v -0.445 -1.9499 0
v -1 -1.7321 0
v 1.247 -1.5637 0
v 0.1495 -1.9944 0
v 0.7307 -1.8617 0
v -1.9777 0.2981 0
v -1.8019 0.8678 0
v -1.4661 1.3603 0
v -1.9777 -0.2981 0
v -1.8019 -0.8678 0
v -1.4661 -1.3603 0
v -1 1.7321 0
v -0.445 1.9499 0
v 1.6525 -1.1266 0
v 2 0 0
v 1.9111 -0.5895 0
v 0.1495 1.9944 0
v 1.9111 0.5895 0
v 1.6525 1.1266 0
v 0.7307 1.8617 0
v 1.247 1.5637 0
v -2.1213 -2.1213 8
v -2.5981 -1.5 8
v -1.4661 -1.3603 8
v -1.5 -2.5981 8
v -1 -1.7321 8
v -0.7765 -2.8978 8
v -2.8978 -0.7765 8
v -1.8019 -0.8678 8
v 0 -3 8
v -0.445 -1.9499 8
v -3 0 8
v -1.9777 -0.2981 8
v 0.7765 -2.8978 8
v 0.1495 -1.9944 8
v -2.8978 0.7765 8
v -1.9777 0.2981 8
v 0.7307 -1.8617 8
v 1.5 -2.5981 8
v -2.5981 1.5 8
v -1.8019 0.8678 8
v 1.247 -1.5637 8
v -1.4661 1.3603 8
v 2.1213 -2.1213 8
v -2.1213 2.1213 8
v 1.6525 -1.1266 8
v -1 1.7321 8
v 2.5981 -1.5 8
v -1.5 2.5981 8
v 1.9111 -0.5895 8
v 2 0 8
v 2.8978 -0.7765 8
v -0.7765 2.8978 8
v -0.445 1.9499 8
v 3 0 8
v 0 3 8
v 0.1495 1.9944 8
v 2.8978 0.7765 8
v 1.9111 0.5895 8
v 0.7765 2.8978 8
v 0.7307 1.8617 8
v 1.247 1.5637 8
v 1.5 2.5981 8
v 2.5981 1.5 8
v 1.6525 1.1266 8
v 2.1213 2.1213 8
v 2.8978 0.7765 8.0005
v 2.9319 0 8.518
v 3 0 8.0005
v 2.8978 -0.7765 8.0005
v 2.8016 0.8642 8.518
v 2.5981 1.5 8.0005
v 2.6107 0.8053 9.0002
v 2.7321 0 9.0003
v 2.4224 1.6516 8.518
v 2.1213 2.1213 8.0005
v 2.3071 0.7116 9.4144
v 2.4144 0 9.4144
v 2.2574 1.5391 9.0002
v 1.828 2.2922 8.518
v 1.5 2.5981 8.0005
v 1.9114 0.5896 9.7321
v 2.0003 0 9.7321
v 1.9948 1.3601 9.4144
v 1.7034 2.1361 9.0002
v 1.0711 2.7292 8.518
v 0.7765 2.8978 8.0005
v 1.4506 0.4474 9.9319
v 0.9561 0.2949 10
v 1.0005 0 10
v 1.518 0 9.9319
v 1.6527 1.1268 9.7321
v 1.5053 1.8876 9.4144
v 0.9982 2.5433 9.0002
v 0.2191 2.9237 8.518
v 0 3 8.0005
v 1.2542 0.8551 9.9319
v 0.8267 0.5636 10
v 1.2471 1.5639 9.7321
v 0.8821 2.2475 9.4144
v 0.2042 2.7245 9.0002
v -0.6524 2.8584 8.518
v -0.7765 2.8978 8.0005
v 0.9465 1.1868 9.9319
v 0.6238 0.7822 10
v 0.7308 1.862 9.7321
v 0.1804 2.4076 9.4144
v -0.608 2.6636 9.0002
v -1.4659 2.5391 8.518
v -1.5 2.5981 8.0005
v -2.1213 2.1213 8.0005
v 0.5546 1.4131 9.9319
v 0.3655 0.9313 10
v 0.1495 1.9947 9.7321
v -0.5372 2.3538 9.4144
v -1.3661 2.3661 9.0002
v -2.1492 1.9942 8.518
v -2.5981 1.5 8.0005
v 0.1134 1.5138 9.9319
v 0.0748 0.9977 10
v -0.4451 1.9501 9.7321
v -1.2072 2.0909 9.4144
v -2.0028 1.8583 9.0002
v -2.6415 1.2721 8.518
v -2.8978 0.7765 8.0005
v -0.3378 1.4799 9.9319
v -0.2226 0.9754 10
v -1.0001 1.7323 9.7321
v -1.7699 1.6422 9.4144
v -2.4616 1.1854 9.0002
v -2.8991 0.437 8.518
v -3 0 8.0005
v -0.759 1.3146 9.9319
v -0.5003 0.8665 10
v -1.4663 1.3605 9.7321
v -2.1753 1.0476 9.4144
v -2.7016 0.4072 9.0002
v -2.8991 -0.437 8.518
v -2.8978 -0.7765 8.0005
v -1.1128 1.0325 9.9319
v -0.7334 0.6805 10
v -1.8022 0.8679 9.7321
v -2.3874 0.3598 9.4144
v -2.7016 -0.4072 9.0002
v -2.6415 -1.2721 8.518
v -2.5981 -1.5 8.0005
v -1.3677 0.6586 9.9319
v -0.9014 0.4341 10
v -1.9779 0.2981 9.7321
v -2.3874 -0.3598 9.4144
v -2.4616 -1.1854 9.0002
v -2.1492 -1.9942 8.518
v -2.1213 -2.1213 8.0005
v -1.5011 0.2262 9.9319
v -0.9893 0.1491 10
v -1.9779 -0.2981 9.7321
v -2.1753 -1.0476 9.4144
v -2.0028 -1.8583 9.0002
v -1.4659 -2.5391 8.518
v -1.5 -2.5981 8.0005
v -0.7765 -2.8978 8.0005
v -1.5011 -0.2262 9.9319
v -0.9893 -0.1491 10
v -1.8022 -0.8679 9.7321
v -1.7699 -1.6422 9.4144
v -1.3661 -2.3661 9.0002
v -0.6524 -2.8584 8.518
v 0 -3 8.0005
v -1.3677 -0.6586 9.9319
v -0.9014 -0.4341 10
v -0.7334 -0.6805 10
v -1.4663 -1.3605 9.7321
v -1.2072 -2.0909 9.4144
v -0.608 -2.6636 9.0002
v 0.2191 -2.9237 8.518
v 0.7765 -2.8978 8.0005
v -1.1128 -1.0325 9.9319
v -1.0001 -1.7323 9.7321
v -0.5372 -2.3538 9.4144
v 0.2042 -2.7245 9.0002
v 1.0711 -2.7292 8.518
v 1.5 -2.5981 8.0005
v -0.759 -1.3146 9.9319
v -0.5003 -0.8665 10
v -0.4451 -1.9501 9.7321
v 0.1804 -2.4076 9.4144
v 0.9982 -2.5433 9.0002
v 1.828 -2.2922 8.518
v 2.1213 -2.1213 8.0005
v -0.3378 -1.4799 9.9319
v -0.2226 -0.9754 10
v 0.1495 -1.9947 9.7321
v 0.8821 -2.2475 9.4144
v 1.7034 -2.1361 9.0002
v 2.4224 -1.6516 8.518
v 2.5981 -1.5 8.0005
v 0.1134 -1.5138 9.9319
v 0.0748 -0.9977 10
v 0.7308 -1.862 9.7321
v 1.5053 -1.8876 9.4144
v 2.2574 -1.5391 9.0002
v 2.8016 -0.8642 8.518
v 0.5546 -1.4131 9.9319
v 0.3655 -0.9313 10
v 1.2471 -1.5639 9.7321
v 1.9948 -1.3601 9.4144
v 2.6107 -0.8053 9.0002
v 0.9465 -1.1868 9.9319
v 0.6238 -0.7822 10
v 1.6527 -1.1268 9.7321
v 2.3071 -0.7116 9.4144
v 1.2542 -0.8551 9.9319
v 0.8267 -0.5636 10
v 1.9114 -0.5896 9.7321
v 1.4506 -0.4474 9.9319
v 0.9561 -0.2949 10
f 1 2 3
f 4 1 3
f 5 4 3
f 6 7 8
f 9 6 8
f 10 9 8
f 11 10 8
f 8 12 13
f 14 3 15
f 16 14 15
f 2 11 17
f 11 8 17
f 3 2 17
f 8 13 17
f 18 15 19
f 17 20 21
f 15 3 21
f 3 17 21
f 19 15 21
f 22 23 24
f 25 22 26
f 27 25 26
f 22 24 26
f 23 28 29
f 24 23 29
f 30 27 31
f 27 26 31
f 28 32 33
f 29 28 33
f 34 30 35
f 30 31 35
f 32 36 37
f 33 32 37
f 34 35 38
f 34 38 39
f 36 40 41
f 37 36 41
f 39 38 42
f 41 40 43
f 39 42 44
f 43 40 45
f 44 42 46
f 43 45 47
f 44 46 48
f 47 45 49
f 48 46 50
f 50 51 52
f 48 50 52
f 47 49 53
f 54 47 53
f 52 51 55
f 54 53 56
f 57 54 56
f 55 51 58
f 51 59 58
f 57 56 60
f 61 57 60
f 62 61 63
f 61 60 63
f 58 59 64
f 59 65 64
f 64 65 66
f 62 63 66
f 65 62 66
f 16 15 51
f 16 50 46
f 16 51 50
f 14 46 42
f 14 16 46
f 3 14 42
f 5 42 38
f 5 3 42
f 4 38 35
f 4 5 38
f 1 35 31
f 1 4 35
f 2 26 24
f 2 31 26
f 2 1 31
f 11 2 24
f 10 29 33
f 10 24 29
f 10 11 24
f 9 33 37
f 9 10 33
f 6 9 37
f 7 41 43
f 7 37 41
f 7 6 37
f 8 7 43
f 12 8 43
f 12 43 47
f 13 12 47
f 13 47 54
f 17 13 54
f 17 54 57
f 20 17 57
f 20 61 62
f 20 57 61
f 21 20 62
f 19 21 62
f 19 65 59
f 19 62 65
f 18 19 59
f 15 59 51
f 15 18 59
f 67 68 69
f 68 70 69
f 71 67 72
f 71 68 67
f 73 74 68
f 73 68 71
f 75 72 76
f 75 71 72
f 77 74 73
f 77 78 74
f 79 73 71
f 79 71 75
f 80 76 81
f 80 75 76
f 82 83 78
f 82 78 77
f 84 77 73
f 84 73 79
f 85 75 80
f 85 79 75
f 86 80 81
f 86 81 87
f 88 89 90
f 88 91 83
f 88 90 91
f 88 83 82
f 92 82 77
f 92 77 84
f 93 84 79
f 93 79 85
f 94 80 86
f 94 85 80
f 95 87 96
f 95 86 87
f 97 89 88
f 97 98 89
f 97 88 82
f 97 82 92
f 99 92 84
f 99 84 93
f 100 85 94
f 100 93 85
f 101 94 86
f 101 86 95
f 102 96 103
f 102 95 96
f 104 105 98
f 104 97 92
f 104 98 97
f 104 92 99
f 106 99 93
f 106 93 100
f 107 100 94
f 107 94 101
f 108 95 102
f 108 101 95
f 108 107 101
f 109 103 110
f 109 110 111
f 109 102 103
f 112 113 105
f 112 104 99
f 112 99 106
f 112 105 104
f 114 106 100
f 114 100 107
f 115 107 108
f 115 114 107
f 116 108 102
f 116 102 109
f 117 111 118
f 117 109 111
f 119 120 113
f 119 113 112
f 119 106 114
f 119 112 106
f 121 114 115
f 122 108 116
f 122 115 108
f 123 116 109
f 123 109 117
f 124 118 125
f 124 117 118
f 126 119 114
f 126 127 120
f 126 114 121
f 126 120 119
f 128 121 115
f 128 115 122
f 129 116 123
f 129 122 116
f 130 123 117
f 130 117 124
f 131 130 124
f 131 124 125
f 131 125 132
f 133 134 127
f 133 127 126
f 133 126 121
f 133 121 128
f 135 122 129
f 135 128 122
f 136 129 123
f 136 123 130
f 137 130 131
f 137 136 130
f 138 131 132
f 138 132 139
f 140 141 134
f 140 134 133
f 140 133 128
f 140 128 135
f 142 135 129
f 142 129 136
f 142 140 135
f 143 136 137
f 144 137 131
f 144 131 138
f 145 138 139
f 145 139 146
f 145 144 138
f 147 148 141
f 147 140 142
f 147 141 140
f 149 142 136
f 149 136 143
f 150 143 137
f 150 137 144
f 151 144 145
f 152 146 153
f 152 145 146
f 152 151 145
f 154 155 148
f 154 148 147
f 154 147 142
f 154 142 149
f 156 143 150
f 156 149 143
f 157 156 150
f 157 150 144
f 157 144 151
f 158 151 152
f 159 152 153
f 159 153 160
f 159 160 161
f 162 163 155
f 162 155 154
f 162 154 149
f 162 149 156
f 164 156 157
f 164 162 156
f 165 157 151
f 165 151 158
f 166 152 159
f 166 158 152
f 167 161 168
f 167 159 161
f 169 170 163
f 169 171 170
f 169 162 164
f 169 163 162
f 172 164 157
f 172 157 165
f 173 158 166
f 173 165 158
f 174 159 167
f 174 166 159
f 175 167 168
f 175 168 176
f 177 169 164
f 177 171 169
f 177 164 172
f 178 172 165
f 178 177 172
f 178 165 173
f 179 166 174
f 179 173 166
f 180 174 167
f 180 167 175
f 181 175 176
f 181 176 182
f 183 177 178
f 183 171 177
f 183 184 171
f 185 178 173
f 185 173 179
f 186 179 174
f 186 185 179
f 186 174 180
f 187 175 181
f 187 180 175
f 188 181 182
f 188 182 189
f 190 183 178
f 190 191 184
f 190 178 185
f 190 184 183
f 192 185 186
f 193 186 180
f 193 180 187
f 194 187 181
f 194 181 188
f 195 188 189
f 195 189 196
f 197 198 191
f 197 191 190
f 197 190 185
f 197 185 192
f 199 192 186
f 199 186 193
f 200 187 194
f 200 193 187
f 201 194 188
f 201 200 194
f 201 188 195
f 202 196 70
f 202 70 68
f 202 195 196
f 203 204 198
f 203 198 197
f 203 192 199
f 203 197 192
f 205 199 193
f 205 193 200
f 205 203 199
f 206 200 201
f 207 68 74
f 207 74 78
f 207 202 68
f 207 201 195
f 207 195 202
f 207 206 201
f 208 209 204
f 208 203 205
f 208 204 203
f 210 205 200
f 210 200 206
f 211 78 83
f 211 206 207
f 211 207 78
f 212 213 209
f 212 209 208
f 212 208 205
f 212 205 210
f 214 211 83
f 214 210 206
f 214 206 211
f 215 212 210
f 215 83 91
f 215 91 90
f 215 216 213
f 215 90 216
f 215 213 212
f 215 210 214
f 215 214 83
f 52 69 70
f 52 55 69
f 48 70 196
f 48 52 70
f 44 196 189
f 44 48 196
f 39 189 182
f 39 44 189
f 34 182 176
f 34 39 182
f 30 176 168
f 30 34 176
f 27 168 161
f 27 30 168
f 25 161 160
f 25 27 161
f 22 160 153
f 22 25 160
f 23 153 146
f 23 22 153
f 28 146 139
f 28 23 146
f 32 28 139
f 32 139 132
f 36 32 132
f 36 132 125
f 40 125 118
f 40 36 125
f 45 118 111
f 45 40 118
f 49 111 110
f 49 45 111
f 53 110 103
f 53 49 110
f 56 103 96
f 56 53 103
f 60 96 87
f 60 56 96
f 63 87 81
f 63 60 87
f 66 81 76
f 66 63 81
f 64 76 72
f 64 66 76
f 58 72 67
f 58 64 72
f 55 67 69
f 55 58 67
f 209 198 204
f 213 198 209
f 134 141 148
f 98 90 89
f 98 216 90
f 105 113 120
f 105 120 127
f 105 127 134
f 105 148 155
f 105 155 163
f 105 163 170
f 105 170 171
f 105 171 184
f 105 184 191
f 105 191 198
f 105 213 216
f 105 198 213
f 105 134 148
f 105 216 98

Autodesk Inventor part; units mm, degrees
ref_plane "YZ Plane" through (0, 0, 0) normal (1, 0, 0) x (0, 1, 0)
ref_plane "XZ Plane" through (0, 0, 0) normal (0, 1, 0) x (-1, 0, 0)
ref_plane "XY Plane" through (0, 0, 0) normal (0, 0, 1) x (1, 0, 0)
sketch "スケッチ1" plane through (0, 0, 0) normal (0, 0, 1) x (1, 0, 0)
  circle A0 centre (0, 0) radius 2
  dimension "d0" = 4
extrude "押し出し1" add sketch "スケッチ1" along normal blind 8
sketch "スケッチ2" plane through (0, 0, 8) normal (0, 0, 1) x (1, 0, 0)
  circle A0 centre (0, 0) radius 2 projected
  circle A1 centre (0, 0) radius 3
  dimension "d3" = 6
extrude "押し出し2" add sketch "スケッチ2" along normal blind 2 contours A0 | A1
fillet "フィレット1" radius 2 1 edges at (-3, 0, 10)
properties part number "M4ボタンボルト8" material "鋼、高強度、低合金"
